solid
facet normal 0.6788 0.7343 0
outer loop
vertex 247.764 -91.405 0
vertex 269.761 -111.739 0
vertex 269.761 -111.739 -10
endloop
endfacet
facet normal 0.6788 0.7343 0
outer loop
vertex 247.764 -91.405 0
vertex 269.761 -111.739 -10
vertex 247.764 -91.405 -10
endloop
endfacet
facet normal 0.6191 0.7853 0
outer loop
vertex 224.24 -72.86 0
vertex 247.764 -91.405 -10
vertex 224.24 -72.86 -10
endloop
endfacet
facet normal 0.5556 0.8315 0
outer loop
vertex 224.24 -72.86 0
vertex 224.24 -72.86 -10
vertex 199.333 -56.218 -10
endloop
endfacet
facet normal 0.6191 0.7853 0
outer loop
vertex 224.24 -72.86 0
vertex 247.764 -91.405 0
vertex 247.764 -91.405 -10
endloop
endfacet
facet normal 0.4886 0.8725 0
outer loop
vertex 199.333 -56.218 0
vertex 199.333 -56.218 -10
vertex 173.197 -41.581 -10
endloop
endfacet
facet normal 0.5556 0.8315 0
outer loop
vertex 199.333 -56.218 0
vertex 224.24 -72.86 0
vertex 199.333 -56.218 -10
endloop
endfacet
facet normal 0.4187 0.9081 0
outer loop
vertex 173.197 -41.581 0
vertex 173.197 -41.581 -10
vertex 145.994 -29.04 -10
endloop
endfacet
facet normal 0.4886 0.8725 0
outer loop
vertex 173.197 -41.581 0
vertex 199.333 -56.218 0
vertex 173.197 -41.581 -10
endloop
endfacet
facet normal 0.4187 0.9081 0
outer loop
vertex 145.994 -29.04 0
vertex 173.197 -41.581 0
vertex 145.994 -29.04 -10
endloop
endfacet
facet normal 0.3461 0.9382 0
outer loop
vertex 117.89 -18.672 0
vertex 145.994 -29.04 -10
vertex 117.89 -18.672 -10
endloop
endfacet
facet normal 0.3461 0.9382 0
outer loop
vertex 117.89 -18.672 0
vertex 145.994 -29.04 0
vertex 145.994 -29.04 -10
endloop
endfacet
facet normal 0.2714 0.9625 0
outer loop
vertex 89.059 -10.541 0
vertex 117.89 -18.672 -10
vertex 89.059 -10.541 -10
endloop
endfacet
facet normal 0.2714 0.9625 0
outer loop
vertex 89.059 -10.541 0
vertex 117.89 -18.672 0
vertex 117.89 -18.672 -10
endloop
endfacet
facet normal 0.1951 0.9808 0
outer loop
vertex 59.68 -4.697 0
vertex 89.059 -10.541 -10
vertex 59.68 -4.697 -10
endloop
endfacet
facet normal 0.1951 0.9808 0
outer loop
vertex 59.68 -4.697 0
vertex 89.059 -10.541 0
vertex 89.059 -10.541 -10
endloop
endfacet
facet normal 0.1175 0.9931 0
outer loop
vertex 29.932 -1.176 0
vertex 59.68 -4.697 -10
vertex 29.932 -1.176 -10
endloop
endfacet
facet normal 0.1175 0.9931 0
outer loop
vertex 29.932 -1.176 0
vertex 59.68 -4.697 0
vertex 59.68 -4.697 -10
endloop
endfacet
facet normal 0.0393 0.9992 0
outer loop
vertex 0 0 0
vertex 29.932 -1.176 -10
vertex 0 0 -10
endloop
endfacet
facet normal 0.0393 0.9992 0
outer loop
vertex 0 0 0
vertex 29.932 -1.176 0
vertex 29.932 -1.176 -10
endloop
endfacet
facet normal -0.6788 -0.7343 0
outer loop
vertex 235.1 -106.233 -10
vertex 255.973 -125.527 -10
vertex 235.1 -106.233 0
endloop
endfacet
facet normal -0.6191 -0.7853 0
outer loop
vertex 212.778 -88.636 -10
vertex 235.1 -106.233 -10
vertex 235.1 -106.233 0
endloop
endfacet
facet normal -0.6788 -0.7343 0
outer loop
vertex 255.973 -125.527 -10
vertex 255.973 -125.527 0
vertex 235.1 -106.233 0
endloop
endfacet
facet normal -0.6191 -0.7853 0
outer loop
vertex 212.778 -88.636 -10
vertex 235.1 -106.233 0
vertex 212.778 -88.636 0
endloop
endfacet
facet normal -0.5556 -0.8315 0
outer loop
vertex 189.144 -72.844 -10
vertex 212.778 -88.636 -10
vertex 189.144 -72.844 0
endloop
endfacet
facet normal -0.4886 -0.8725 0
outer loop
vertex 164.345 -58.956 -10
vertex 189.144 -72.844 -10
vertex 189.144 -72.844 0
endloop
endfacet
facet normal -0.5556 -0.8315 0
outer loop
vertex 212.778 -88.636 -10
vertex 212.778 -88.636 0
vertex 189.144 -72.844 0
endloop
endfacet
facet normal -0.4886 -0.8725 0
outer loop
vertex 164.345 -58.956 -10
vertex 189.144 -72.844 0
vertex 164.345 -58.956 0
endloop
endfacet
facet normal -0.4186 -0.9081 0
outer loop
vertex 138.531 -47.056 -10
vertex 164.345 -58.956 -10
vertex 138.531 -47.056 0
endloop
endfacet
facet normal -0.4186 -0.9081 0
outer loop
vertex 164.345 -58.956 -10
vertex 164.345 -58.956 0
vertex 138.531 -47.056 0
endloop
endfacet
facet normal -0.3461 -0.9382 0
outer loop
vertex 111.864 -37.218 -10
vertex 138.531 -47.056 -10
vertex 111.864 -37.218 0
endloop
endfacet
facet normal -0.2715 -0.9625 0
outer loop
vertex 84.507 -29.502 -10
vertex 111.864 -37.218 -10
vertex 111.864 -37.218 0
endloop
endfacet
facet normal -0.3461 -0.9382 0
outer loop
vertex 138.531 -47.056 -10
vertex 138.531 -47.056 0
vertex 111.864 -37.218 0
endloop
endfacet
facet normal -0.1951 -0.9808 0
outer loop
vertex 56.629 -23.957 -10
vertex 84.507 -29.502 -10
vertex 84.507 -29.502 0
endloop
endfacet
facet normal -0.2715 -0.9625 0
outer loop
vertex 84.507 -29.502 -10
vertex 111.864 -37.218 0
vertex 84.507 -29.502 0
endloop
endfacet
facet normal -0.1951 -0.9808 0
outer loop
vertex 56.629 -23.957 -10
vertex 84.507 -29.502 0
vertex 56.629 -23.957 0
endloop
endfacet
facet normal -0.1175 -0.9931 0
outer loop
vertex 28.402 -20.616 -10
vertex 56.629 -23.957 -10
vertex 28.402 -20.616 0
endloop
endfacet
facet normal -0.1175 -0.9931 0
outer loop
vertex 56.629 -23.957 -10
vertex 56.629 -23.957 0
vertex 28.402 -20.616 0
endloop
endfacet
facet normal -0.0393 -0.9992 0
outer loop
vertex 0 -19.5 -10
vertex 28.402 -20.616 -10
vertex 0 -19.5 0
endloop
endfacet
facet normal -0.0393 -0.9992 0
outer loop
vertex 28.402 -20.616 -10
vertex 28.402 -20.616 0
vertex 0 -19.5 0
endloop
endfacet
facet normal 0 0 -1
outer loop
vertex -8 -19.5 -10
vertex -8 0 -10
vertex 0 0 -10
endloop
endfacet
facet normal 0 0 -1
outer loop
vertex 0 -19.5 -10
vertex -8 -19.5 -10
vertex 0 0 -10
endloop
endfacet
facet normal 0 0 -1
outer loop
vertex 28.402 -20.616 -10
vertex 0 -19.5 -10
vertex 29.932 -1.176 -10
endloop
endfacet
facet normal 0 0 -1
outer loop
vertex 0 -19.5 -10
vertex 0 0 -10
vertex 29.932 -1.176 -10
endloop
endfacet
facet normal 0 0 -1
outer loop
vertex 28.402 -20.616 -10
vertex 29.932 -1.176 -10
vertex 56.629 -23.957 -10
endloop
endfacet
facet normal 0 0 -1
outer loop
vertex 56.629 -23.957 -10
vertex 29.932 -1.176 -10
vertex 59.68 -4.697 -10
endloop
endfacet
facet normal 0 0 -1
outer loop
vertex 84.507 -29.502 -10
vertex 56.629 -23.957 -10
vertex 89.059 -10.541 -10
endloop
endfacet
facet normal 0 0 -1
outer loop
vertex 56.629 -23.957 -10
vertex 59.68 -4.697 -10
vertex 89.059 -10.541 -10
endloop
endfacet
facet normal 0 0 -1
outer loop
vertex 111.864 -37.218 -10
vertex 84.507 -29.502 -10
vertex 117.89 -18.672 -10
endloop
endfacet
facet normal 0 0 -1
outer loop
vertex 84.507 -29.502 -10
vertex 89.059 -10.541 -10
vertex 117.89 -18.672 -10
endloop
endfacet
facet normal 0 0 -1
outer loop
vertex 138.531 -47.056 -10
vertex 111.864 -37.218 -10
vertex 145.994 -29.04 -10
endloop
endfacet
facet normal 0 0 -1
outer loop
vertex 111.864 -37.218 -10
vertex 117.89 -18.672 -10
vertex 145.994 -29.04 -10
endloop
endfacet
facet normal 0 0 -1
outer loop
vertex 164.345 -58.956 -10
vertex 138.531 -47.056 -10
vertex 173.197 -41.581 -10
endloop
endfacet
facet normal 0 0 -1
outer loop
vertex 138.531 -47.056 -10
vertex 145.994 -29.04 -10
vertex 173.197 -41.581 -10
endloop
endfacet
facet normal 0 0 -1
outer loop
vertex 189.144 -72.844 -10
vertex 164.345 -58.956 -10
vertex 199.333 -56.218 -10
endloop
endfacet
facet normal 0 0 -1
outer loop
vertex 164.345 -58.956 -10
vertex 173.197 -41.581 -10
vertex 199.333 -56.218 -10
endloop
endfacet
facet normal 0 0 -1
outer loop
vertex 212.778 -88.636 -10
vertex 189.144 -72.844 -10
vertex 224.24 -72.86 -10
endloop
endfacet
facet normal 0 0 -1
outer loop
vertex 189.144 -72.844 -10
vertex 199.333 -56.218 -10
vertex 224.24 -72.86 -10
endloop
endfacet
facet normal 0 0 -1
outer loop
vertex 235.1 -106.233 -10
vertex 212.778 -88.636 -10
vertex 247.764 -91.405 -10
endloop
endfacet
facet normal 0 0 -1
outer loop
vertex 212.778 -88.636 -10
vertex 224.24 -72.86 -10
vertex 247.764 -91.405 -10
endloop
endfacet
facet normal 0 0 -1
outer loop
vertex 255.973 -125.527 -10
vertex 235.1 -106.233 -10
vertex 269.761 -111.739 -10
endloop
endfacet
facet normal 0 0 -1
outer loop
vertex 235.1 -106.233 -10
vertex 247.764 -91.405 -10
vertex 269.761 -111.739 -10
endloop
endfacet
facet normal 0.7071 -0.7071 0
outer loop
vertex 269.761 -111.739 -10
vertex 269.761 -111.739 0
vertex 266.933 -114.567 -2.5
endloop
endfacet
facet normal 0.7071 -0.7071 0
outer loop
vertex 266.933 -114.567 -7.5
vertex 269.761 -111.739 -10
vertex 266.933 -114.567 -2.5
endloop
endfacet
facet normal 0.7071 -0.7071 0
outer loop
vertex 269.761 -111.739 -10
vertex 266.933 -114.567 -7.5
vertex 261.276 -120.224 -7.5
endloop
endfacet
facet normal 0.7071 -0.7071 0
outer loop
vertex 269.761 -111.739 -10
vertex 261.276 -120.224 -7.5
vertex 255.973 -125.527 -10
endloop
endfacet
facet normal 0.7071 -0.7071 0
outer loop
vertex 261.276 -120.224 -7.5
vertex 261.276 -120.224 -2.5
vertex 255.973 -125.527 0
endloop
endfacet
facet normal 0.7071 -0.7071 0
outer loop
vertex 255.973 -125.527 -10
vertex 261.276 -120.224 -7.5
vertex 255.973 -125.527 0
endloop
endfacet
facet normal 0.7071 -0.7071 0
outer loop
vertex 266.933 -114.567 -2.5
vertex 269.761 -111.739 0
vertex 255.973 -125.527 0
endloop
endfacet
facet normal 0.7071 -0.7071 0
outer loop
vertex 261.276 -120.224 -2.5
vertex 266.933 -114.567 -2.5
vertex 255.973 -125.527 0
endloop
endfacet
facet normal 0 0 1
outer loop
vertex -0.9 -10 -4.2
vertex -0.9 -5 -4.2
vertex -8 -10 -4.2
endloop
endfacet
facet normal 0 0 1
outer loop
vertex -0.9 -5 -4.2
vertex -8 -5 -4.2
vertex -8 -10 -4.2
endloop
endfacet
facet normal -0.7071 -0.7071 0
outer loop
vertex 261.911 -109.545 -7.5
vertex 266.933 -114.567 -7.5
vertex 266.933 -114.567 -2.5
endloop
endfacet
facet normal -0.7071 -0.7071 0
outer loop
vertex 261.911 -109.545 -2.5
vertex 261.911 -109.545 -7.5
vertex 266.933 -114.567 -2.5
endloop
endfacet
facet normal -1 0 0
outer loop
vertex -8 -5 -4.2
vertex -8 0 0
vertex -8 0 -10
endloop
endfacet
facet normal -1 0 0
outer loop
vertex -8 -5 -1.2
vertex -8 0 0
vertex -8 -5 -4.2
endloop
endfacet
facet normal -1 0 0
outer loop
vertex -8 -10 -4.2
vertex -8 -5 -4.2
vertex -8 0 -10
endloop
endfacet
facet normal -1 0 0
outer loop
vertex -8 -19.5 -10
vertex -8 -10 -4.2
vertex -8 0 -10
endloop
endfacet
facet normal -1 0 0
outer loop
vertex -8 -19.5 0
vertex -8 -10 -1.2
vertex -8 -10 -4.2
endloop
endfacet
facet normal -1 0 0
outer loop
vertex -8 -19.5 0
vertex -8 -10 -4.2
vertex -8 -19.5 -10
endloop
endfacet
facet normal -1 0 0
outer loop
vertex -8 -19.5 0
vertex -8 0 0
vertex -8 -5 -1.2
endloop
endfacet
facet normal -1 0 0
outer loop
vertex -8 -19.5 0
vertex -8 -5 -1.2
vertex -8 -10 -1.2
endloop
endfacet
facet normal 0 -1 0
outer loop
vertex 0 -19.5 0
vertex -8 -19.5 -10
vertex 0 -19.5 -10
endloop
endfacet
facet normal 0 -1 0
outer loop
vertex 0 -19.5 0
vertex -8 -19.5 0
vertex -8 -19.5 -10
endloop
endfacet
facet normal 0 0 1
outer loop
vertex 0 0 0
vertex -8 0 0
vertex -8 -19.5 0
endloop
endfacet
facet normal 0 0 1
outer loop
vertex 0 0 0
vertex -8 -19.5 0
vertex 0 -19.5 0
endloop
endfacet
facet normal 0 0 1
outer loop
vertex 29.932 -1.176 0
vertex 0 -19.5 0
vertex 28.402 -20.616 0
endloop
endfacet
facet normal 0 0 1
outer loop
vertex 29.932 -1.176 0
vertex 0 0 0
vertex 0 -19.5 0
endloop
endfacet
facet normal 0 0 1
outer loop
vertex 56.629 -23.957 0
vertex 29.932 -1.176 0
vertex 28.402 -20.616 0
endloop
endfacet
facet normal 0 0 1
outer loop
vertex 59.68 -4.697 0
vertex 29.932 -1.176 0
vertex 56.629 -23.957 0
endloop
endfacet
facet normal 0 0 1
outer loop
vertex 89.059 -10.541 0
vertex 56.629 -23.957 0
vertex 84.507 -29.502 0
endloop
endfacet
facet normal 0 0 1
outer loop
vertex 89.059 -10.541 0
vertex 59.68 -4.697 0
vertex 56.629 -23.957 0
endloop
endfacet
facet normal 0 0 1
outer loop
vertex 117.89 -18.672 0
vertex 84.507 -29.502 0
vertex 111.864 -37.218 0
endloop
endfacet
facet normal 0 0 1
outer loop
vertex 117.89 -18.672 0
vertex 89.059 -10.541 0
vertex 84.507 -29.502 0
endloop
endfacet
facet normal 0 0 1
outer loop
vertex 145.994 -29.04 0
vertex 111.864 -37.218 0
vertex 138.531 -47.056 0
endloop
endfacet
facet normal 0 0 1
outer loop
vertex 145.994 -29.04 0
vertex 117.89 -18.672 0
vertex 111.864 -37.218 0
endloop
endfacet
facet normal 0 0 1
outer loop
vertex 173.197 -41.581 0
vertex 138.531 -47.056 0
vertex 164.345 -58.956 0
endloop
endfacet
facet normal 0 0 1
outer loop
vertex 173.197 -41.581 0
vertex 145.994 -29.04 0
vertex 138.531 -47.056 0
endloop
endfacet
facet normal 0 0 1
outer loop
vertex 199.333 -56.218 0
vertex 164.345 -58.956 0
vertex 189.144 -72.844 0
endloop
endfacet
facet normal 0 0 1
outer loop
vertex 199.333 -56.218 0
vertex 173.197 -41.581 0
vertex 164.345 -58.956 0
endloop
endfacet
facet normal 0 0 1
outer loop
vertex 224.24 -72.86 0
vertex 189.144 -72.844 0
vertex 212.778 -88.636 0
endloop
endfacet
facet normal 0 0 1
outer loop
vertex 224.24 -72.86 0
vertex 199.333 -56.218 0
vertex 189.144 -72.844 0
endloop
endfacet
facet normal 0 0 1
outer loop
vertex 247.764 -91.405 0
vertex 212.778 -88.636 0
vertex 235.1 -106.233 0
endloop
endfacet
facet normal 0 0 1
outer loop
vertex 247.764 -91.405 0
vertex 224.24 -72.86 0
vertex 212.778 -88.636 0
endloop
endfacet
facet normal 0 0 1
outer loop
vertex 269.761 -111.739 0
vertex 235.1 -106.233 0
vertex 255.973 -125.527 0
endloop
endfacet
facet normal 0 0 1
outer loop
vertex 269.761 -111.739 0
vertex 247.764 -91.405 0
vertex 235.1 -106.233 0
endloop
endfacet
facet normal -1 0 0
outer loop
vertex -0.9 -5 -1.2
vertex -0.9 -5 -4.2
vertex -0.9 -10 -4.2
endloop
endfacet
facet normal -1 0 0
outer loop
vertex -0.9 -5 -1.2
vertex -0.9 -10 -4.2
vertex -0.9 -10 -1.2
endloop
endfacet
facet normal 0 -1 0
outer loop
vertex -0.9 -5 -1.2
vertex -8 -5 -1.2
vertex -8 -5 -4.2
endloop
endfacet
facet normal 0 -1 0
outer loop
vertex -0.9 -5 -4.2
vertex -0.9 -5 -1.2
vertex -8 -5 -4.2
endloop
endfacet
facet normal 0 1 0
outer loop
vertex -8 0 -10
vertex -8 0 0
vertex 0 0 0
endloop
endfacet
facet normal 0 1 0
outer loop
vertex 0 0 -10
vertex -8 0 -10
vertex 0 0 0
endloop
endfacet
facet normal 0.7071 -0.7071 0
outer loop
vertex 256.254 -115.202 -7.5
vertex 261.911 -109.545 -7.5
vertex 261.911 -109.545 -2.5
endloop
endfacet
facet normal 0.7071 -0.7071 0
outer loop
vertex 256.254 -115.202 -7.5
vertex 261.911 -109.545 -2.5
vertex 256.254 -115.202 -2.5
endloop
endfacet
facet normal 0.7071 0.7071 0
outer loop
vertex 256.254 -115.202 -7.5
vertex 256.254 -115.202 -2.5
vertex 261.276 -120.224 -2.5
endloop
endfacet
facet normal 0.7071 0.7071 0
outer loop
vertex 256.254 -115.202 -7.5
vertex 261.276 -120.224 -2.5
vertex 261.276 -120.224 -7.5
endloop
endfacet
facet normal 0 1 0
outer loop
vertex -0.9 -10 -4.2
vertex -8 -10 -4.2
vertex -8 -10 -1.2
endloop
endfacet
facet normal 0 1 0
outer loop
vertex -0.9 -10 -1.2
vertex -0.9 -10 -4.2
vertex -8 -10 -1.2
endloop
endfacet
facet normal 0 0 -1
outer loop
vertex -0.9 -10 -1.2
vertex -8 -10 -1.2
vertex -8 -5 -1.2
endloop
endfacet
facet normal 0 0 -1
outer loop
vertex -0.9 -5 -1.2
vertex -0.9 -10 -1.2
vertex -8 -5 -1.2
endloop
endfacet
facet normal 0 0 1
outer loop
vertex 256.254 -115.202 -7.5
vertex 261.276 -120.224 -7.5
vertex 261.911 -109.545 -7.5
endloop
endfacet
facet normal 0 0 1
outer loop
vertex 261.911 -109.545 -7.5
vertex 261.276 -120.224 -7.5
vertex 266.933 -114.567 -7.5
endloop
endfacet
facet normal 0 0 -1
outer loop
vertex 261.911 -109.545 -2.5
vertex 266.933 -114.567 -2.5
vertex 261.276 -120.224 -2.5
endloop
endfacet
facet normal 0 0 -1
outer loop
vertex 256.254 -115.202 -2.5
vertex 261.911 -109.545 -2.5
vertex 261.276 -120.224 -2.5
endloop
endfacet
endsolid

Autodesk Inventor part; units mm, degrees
ref_plane "YZ Plane" through (0, 0, 0) normal (1, 0, 0) x (0, 1, 0)
ref_plane "XZ Plane" through (0, 0, 0) normal (0, 1, 0) x (-1, 0, 0)
ref_plane "XY Plane" through (0, 0, 0) normal (0, 0, 1) x (1, 0, 0)
sketch "Sketch1" plane through (0, 0, 0) normal (0, 0, 1) x (1, 0, 0)
  arc A0 (381.5, -381.5) -> (0, 0) centre (0, -381.5) ccw projected
  line L0 (-227, 0) -> (0, 0) projected
  line L1 (381.5, -381.5) -> (381.5, -681.5) projected
  line L2 (-227, -19.5) -> (0, -19.5)
  arc A1 (362, -381.5) -> (0, -19.5) centre (0, -381.5) ccw
  line L3 (362, -381.5) -> (362, -681.5)
  line L4 (-8, 0) -> (-8, -19.5)
  line L5 (381.5, -389.5) -> (362, -389.5)
  line L6 (269.7612, -111.7388) -> (255.9727, -125.5273)
  dimension "d0" = 19.5
  dimension "d1" = 8
  dimension "d2" = 8
extrude "Extrusion1" add sketch "Sketch1" against normal blind 10 contours L6 A1 L2 L4 L0 A0
sketch "Sketch2" plane through (-8, -19.5, 0) normal (-1, 0, 0) x (0, 0, 1)
  line L0 (0, 19.5) -> (0, 0) projected
  line L1 (0, 19.5) -> (-10, 19.5) projected
  line L2 (-10, 0) -> (-10, 19.5) projected
  line L3 (0, 0) -> (-10, 0) projected
  line L4 (-1.2, 14.5) -> (-4.2, 14.5)
  line L5 (-4.2, 14.5) -> (-4.2, 9.5)
  line L6 (-4.2, 9.5) -> (-1.2, 9.5)
  line L7 (-1.2, 9.5) -> (-1.2, 14.5)
  line L8 (-1.2, 14.5) -> (-4.2, 9.5) construction
  line L9 (-4.2, 14.5) -> (-1.2, 9.5) construction
  point P0 (0, 19.5)
  point P1 (-2.7, 12)
  dimension "d5" = 3
  dimension "d6" = 5
  dimension "d7" = 1.2
  dimension "d8" = 5
extrude "Extrusion2" cut sketch "Sketch2" against normal blind 7.1 contours L7 L6 L5 L4
sketch "Sketch3" plane through (255.9727, -125.5273, 0) normal (0.7071, -0.7071, 0) x (-0.7071, -0.7071, 0)
  line L0 (0, 0) -> (-19.5, 0) projected
  line L1 (0, 0) -> (0, 10) projected
  line L2 (-19.5, 10) -> (0, 10) projected
  line L3 (-19.5, 0) -> (-19.5, 10) projected
  line L4 (-15.5, 2.5) -> (-7.5, 2.5)
  line L5 (-7.5, 2.5) -> (-7.5, 7.5)
  line L6 (-7.5, 7.5) -> (-15.5, 7.5)
  line L7 (-15.5, 7.5) -> (-15.5, 2.5)
  line L8 (-15.5, 2.5) -> (-7.5, 7.5) construction
  line L9 (-7.5, 2.5) -> (-15.5, 7.5) construction
  line L10 (-15.7, 2.3) -> (-7.3, 2.3)
  line L11 (-7.3, 2.3) -> (-7.3, 7.7)
  line L12 (-7.3, 7.7) -> (-15.7, 7.7)
  line L13 (-15.7, 7.7) -> (-15.7, 2.3)
  point P0 (92.2388, 0)
  point P1 (-11.5, 5)
  point P2 (-15.5, 5)
  point P3 (-19.5, 5)
  dimension "d11" = 8
  dimension "d12" = 5
  dimension "d13" = 4
  dimension "d16" = 0.2
extrude "Extrusion3" cut sketch "Sketch3" against normal blind 7.1 contours L7 L6 L5 L4
properties part number "SEPARADOR_3"
